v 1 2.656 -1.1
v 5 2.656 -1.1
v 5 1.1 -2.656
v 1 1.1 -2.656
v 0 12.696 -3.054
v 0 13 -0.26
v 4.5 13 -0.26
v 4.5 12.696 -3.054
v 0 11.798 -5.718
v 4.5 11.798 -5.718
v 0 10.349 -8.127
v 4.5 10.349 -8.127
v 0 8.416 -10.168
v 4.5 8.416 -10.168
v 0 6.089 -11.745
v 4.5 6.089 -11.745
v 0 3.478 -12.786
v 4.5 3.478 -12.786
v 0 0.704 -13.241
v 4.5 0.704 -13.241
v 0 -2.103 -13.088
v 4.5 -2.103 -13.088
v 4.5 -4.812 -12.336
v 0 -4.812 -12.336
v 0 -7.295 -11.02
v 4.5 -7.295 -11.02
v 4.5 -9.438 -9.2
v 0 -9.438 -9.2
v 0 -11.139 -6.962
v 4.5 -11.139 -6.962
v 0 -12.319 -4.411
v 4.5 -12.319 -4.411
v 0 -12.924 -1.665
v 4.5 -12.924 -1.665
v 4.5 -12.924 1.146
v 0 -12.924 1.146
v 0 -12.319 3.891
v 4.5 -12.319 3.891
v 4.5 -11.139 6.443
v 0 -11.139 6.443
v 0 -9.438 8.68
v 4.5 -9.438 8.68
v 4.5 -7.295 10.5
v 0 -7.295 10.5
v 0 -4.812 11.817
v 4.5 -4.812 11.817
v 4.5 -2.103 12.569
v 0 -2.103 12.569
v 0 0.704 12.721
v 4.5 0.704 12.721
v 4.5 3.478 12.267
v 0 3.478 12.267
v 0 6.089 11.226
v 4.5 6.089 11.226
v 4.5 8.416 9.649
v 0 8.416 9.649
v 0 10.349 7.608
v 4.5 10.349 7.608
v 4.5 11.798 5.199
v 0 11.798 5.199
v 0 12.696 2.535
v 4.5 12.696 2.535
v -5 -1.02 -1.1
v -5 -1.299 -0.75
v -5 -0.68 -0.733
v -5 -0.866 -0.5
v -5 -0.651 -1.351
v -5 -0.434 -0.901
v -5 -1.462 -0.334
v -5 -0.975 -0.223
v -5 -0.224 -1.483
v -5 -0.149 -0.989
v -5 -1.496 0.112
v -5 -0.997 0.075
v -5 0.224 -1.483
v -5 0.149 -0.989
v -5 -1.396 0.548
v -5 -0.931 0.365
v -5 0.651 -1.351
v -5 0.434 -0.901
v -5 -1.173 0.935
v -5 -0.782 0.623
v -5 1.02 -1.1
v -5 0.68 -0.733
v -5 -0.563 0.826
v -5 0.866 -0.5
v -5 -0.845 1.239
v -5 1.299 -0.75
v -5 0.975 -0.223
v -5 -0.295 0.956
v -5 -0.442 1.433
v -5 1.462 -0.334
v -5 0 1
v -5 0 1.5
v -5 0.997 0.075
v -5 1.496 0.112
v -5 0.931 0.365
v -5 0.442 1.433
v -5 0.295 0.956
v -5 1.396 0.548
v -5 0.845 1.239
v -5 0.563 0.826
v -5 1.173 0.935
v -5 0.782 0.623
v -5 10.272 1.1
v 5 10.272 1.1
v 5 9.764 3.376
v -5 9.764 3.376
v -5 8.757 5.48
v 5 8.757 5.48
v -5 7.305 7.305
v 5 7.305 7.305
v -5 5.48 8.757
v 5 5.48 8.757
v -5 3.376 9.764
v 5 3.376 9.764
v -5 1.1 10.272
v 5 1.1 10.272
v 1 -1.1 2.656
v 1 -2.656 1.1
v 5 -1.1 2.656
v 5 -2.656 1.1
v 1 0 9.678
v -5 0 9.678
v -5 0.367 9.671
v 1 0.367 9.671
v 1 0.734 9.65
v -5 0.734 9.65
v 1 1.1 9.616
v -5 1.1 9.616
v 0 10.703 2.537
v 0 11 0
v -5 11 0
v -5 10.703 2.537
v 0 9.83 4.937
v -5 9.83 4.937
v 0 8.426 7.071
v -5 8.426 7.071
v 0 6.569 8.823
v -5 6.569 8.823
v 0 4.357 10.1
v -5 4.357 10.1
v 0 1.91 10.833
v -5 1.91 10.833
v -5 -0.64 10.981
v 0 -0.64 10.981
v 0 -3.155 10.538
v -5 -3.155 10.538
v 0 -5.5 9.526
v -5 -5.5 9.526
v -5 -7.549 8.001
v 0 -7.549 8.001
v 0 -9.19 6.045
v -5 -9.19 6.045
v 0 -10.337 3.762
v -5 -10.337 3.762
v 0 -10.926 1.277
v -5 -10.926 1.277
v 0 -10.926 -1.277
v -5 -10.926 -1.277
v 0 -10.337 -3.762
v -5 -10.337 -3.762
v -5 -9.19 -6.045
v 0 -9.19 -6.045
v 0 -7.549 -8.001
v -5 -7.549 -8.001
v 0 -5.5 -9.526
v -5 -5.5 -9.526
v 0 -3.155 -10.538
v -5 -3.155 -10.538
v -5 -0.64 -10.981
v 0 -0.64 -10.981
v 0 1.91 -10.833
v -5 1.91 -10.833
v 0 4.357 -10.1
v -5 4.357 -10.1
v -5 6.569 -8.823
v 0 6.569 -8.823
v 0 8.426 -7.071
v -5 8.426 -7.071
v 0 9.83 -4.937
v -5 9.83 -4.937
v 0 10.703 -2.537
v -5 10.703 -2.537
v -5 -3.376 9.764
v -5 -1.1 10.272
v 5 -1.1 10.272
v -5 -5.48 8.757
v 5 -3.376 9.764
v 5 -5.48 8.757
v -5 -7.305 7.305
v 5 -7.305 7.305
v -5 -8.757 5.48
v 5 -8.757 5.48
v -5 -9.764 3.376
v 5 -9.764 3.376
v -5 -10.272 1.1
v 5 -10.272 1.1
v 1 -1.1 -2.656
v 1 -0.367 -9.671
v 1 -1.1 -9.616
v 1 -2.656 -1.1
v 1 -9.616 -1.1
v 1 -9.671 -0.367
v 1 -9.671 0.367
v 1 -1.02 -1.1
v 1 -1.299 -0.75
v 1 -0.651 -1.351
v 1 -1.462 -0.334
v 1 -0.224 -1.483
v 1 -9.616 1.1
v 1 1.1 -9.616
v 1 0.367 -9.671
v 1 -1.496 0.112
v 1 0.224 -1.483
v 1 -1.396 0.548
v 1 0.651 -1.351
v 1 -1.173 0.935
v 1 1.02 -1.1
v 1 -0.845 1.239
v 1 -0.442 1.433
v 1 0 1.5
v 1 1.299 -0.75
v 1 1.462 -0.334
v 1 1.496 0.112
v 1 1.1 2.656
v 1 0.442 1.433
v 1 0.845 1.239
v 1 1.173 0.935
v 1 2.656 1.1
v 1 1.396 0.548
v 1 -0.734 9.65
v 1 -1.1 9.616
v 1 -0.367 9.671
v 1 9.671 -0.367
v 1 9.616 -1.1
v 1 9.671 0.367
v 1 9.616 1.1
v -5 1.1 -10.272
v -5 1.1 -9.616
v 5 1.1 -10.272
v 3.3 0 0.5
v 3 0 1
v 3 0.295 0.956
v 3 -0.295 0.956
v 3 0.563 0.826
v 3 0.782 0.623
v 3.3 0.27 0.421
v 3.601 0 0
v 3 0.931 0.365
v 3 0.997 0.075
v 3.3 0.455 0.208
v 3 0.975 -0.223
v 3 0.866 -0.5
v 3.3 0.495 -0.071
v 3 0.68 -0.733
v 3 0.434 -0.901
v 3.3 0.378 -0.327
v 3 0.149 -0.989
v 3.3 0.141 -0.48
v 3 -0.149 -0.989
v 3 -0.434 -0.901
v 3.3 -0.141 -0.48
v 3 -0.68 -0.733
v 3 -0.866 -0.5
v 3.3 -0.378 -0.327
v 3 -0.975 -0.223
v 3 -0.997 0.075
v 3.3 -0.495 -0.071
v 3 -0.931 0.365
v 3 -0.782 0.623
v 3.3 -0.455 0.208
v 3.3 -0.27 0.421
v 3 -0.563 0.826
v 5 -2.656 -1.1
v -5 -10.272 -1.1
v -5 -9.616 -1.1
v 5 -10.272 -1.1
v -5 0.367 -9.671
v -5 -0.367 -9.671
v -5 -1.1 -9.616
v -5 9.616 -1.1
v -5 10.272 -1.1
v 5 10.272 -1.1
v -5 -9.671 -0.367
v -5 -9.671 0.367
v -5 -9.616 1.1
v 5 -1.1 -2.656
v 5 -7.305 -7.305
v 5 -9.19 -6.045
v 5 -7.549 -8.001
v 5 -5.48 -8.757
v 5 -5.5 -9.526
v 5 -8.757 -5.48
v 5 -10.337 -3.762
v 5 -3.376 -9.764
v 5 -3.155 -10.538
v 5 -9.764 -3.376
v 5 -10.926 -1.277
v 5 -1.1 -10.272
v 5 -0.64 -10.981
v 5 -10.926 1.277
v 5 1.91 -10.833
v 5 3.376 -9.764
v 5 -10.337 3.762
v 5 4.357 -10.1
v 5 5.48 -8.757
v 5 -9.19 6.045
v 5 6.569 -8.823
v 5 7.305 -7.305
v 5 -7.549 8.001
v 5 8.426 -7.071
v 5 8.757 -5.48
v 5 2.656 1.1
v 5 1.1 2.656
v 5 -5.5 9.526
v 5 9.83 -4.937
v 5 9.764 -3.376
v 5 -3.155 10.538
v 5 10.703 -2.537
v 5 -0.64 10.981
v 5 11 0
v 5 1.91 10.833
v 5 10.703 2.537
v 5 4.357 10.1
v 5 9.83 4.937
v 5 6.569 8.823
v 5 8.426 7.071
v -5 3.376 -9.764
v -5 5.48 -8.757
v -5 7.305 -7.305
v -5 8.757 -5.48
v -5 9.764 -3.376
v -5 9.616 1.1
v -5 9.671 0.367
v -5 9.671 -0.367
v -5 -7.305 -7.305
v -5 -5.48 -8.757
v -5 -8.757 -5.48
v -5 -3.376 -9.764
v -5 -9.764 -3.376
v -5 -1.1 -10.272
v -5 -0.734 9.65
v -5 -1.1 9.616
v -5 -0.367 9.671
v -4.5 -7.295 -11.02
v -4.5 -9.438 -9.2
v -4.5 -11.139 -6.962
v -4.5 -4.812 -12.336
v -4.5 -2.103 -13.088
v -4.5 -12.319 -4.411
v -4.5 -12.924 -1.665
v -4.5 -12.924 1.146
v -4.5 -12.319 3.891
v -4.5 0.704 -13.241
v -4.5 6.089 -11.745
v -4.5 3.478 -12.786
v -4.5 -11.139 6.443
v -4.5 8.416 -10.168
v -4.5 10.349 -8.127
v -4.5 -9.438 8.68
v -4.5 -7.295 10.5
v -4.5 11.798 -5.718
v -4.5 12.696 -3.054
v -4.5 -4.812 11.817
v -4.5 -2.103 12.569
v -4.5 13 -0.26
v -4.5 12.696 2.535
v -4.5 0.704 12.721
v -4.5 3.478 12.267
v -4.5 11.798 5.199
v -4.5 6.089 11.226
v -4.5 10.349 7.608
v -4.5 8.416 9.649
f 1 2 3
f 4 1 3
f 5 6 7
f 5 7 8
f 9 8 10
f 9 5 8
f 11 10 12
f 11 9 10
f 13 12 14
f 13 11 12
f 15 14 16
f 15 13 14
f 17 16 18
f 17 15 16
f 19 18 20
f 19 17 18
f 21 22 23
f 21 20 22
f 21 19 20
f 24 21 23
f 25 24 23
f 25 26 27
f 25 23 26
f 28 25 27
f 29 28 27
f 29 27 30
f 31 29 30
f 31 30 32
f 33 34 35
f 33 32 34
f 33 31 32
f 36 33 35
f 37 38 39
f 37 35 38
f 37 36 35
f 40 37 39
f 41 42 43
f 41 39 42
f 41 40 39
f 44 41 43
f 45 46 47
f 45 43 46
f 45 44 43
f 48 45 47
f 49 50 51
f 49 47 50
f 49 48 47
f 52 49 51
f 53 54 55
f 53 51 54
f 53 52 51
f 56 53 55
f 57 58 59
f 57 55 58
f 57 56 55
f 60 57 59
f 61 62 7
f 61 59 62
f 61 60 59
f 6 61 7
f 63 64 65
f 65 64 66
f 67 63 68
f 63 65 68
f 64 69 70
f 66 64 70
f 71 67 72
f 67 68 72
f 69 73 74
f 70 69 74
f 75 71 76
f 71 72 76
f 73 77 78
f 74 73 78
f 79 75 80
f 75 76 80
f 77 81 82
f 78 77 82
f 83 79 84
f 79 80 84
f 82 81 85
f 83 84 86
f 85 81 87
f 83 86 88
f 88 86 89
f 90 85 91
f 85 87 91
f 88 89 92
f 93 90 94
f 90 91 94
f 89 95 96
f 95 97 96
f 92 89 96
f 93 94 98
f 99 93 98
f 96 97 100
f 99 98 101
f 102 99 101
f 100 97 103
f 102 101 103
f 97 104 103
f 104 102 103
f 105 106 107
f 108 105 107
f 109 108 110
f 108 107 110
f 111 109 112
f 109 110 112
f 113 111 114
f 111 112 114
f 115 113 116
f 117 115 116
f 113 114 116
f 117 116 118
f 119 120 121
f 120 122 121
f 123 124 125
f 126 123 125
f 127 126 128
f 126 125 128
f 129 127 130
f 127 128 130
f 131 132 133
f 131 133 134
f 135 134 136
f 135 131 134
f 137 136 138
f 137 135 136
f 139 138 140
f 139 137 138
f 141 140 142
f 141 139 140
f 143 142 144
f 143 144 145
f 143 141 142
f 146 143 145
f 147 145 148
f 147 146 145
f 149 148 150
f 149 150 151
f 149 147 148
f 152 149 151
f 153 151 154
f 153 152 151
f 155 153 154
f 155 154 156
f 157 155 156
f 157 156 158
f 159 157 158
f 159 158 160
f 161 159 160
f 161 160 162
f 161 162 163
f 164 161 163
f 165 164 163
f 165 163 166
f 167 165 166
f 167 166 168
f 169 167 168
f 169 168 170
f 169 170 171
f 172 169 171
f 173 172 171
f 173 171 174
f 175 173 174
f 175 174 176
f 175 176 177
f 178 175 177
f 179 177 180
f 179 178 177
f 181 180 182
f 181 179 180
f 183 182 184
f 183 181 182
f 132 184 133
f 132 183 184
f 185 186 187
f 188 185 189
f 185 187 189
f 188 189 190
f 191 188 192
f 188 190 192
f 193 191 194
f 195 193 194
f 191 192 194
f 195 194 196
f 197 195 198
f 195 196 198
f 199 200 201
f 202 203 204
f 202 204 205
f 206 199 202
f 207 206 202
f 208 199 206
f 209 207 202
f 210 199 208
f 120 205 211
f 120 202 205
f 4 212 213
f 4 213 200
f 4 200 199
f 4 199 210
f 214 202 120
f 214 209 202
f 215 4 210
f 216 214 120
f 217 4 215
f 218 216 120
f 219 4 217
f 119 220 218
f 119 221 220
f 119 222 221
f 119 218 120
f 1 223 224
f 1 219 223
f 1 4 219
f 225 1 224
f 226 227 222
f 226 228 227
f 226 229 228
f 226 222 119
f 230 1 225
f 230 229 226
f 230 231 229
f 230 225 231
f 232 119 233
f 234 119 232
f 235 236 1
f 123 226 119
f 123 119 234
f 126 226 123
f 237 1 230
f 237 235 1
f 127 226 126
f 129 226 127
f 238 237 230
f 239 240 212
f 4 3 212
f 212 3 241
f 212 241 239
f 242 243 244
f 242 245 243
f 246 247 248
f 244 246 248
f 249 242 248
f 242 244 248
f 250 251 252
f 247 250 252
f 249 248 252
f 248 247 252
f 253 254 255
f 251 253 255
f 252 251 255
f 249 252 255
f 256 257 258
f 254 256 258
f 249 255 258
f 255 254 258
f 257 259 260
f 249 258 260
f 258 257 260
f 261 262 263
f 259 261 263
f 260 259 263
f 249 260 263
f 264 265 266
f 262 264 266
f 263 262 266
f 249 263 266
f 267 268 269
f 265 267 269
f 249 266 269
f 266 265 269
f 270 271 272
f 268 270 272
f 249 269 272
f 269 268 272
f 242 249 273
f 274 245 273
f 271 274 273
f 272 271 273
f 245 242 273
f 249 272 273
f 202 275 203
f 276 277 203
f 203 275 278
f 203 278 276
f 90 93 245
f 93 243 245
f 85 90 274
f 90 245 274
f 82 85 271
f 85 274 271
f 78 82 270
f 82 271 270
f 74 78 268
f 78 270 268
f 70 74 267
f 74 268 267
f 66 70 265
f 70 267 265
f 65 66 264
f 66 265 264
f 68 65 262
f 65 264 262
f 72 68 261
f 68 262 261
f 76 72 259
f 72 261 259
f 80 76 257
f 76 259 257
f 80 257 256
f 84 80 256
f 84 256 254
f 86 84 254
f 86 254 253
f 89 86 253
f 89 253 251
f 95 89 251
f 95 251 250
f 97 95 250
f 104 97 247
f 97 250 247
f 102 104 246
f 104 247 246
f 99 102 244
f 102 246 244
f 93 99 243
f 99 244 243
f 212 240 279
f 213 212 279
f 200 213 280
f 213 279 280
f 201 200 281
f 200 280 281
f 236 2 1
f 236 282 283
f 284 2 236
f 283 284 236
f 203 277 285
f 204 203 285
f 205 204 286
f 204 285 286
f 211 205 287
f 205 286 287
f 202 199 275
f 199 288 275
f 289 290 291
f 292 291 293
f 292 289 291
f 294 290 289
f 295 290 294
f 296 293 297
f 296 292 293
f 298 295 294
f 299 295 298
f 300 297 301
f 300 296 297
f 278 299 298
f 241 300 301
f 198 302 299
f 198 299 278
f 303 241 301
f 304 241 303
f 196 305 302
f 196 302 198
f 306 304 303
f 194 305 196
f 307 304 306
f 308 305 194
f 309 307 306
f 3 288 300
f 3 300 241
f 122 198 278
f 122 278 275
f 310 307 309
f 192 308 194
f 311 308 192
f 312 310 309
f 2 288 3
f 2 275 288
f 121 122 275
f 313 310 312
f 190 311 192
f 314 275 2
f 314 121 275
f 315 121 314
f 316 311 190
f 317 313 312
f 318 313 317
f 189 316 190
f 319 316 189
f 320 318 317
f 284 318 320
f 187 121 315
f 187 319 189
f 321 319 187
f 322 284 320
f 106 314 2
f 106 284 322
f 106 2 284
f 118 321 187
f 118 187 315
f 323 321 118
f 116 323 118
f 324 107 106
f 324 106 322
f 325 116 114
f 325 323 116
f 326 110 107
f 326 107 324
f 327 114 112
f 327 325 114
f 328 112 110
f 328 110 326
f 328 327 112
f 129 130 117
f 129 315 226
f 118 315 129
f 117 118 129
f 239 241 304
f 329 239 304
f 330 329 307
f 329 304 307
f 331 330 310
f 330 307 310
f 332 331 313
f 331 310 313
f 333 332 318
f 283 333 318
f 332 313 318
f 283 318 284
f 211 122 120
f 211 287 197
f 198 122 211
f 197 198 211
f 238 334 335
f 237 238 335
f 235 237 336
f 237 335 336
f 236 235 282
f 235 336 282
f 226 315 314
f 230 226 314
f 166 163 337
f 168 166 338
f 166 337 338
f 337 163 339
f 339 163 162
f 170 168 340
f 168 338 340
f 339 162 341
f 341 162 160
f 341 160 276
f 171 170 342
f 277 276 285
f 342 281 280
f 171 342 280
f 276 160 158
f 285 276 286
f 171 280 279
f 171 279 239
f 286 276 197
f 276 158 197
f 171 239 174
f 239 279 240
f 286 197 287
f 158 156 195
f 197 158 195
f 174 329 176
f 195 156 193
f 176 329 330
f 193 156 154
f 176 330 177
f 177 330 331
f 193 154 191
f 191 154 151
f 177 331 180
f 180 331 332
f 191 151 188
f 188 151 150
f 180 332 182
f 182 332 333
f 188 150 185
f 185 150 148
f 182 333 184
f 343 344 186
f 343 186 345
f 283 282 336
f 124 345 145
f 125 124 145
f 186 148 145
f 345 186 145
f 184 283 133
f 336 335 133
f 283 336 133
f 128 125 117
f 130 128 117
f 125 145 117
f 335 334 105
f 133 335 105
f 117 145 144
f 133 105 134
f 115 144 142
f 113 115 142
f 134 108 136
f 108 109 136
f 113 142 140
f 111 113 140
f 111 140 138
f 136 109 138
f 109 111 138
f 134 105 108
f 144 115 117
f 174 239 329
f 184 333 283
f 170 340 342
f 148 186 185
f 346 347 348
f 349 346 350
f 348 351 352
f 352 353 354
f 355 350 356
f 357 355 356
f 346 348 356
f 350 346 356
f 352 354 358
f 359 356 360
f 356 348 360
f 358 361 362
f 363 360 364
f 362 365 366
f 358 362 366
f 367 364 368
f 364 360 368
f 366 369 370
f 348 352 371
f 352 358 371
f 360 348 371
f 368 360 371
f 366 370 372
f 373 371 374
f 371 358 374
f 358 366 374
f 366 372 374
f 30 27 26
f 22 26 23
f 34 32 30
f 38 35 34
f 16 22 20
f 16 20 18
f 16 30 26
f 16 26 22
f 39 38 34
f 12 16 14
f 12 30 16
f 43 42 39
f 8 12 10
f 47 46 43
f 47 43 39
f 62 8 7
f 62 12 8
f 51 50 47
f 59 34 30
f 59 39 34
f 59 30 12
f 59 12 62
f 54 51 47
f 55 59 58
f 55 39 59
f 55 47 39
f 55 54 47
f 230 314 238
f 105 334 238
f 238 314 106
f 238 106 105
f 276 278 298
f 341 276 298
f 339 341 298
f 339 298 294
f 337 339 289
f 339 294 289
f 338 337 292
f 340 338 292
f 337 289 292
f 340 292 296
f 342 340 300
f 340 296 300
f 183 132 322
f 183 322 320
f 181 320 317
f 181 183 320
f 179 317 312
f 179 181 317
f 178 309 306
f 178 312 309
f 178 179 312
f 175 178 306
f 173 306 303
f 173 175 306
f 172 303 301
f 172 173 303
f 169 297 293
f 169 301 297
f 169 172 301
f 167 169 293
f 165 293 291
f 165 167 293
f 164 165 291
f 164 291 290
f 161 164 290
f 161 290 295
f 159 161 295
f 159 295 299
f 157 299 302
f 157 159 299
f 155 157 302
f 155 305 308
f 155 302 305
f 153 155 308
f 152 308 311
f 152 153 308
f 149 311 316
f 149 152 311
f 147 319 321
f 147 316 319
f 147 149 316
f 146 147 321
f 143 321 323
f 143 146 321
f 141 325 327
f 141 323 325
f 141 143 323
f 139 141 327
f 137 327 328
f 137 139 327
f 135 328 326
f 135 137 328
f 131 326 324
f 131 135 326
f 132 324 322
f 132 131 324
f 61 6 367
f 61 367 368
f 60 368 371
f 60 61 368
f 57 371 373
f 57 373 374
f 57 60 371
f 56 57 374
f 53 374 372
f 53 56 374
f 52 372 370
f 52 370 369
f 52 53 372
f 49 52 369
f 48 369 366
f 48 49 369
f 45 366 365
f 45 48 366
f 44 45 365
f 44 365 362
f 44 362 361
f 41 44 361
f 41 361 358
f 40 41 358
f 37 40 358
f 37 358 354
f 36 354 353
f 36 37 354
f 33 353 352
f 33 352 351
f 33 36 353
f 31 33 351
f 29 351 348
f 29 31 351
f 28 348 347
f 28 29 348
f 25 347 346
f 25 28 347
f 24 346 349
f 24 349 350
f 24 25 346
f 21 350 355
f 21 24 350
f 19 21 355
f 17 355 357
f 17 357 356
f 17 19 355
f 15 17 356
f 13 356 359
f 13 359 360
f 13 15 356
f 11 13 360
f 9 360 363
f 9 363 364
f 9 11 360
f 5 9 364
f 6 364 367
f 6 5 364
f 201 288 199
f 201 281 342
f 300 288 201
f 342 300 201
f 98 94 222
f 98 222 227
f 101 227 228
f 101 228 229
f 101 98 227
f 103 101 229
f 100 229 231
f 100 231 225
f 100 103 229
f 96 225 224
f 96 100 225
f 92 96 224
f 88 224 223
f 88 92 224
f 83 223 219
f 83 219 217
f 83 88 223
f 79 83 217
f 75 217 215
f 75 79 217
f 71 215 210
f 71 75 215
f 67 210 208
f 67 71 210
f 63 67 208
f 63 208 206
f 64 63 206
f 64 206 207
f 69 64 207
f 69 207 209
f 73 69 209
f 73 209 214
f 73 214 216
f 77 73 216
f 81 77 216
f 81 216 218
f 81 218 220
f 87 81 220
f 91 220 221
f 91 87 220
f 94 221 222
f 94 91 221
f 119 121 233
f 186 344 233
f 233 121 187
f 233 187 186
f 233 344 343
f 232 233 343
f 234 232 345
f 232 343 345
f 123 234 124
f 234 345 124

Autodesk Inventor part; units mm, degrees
ref_plane "YZ Plane" through (0, 0, 0) normal (1, 0, 0) x (0, 1, 0)
ref_plane "XZ Plane" through (0, 0, 0) normal (0, 1, 0) x (-1, 0, 0)
ref_plane "XY Plane" through (0, 0, 0) normal (0, 0, 1) x (1, 0, 0)
sketch "Sketch1" plane through (0, 0, 0) normal (1, 0, 0) x (0, 1, 0)
  circle A0 centre (0, 0) radius 11
  dimension "d0" = 22
extrude "Extrusion1" add sketch "Sketch1" along normal mid plane 10
sketch "Sketch2" plane through (-5, 0, 0) normal (-1, 0, 0) x (0, 0, 1)
  point P0 (0, 0)
sketch "Sketch3" plane through (0, 0, 0) normal (1, 0, 0) x (0, 1, 0)
  circle A0 centre (0, -0.2596) radius 13
  point P0 (0, 0)
  dimension "d3" = 26
extrude "Extrusion2" add sketch "Sketch3" along normal mid plane 9 separate body
hole "Hole1" at (-5, 0, 0) direction (1, 0, 0) diameter 2 depth 8 tip angle 118 bodies 1
sketch "Sketch4" plane through (-5, 0, 0) normal (-1, 0, 0) x (0, 0, 1)
  circle A0 centre (0, 0) radius 9.6784
  circle A1 centre (0, 0) radius 1 projected
  circle A2 centre (0, 0) radius 1.5
  dimension "d13" = 3
extrude "Extrusion3" cut sketch "Sketch4" against normal blind 6 contours A0 bodies 1
sketch "Sketch6" plane through (5, 0, 0) normal (1, 0, 0) x (0, 0, -1)
  circle A0 centre (0, 0) radius 1.5 projected
  line L0 (-2.6563, -1.1003) -> (-2.6563, 1.1003)
  line L1 (-2.6563, 1.1003) -> (-1.1003, 2.6563)
  line L2 (-1.1003, 2.6563) -> (1.1003, 2.6563)
  line L3 (1.1003, 2.6563) -> (2.6563, 1.1003)
  line L4 (2.6563, 1.1003) -> (2.6563, -1.1003)
  line L5 (2.6563, -1.1003) -> (1.1003, -2.6563)
  line L6 (1.1003, -2.6563) -> (-1.1003, -2.6563)
  line L7 (-1.1003, -2.6563) -> (-2.6563, -1.1003)
  circle A1 centre (0, 0) radius 10.3309
  line L8 (-2.6563, -1.1003) -> (-10.2722, -1.1003)
  line L9 (-1.1003, 2.6563) -> (-1.1003, 10.2722)
  line L10 (2.6563, 1.1003) -> (10.2722, 1.1003)
  line L11 (1.1003, -2.6563) -> (1.1003, -10.2722)
  line L12 (-2.6563, 1.1003) -> (-10.2722, 1.1003)
  line L13 (-1.1003, -2.6563) -> (-1.1003, -10.2722)
  circle A2 centre (0, 0) radius 10.3309
  line L14 (2.6563, -1.1003) -> (10.2722, -1.1003)
  circle A3 centre (0, 0) radius 10.3309
  line L15 (1.1003, 2.6563) -> (1.1003, 10.2722)
  circle A4 centre (0, 0) radius 10.3309
  point P0 (1.1003, -10.2722)
  point P1 (10.2722, 1.1003)
  point P2 (-1.1003, 10.2722)
  dimension "d18" = 360
  dimension "d22" = 360
extrude "Extrusion4" cut sketch "Sketch6" against normal through all contours L7 L13 A1 L8 | L12 A1 L9 L1 | L5 L14 A1 L11 | L15 A1 L10 L3 bodies 1
properties part number "Part3proj" material "Rubber"
